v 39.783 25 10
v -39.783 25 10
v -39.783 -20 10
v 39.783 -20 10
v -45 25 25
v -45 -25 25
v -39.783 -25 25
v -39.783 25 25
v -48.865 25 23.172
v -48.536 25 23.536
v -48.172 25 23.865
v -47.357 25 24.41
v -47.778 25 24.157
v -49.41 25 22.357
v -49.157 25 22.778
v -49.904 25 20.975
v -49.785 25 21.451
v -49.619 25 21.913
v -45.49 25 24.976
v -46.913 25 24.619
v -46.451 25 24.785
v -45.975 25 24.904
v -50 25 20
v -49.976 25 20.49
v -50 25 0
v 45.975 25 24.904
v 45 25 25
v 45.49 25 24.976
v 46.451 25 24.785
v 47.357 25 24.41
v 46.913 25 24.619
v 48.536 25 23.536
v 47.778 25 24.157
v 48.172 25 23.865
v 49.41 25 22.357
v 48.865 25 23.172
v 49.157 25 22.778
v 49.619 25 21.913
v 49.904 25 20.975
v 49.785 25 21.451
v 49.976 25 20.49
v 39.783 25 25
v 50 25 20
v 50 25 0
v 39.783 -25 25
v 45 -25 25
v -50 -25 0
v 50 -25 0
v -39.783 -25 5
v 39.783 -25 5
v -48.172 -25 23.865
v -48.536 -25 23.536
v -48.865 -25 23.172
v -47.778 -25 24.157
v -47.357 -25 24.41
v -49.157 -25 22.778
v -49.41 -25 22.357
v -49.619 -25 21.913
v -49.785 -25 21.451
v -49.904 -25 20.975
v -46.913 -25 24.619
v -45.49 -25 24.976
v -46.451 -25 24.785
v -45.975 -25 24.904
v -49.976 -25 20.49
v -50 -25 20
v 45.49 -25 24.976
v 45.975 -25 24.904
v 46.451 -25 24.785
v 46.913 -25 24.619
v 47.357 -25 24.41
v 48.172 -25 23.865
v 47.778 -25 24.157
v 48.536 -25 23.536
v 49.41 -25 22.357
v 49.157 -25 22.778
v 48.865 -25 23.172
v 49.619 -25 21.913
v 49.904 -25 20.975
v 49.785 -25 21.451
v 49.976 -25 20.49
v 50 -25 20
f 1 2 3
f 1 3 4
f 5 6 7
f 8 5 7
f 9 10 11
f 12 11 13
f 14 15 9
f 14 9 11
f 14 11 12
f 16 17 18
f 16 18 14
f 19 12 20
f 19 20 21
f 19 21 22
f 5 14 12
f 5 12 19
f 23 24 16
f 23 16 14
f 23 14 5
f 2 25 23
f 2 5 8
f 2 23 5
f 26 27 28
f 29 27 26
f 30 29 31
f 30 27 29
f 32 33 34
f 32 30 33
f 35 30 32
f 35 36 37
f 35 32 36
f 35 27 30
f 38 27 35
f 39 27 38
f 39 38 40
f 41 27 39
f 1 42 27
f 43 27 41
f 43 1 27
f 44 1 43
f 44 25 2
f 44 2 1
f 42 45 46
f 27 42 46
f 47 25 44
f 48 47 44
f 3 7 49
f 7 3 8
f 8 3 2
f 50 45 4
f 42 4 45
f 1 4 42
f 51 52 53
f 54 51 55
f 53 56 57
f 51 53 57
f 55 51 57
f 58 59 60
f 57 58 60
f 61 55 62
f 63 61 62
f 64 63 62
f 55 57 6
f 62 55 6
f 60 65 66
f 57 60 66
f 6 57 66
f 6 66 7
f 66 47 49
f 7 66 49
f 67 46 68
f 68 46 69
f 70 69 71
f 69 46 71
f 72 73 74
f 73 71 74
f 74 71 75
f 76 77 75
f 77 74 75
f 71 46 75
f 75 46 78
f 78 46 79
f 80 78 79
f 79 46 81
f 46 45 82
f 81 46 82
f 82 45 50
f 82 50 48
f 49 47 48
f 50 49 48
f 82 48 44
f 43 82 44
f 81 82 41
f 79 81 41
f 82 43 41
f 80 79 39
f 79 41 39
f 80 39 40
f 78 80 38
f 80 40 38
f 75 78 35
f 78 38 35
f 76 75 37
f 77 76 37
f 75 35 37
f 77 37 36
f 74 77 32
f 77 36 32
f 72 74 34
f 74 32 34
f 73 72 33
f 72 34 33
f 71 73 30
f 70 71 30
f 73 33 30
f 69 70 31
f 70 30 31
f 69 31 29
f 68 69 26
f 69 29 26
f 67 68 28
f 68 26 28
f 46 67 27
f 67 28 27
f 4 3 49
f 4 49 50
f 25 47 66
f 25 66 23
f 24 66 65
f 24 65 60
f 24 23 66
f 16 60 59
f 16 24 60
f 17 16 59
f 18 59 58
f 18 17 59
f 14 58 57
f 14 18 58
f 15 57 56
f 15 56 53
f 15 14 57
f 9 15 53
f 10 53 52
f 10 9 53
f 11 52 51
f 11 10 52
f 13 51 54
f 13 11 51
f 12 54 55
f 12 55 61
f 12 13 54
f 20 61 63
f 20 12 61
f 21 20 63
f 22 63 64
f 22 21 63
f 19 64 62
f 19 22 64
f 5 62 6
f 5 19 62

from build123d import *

# Parameters (mm, degrees)
F0_W     = 10.2165445685
F0_H     = 50
F1_DEPTH = 25
F0_W_2   = 79.5669108629
F2_DEPTH = 10
F3_DEPTH = 25
F4_R     = 5
F5_R     = 5
F6_SIZE  = 5


with BuildPart() as f1:
    # F0 (on Top) → F1 (new body)
    with BuildSketch(Plane.XY):
        with Locations((-44.8917277157, 0)):
            Rectangle(F0_W, F0_H)
    extrude(amount=F1_DEPTH)

    # F0 (on Top) → F2 (join)
    with BuildSketch(Plane.XY):
        Rectangle(F0_W_2, F0_H)
    extrude(amount=F2_DEPTH)

    # F0 (on Top) → F3 (join)
    with BuildSketch(Plane.XY):
        with Locations((44.8917277157, 0)):
            Rectangle(F0_W, F0_H)
    extrude(amount=F3_DEPTH)

    # F4
    f4_edges = [f1.edges().sort_by_distance(p)[0] for p in [
        (50, 0, 25),
    ]]
    fillet(f4_edges, radius=F4_R)

    # F5
    f5_edges = [f1.edges().sort_by_distance(p)[0] for p in [
        (-50, 0, 25),
    ]]
    fillet(f5_edges, radius=F5_R)

    # F6
    f6_edges = [f1.edges().sort_by_distance(p)[0] for p in [
        (0, -25, 10),
    ]]
    chamfer(f6_edges, length=F6_SIZE)


solid = f1.part
